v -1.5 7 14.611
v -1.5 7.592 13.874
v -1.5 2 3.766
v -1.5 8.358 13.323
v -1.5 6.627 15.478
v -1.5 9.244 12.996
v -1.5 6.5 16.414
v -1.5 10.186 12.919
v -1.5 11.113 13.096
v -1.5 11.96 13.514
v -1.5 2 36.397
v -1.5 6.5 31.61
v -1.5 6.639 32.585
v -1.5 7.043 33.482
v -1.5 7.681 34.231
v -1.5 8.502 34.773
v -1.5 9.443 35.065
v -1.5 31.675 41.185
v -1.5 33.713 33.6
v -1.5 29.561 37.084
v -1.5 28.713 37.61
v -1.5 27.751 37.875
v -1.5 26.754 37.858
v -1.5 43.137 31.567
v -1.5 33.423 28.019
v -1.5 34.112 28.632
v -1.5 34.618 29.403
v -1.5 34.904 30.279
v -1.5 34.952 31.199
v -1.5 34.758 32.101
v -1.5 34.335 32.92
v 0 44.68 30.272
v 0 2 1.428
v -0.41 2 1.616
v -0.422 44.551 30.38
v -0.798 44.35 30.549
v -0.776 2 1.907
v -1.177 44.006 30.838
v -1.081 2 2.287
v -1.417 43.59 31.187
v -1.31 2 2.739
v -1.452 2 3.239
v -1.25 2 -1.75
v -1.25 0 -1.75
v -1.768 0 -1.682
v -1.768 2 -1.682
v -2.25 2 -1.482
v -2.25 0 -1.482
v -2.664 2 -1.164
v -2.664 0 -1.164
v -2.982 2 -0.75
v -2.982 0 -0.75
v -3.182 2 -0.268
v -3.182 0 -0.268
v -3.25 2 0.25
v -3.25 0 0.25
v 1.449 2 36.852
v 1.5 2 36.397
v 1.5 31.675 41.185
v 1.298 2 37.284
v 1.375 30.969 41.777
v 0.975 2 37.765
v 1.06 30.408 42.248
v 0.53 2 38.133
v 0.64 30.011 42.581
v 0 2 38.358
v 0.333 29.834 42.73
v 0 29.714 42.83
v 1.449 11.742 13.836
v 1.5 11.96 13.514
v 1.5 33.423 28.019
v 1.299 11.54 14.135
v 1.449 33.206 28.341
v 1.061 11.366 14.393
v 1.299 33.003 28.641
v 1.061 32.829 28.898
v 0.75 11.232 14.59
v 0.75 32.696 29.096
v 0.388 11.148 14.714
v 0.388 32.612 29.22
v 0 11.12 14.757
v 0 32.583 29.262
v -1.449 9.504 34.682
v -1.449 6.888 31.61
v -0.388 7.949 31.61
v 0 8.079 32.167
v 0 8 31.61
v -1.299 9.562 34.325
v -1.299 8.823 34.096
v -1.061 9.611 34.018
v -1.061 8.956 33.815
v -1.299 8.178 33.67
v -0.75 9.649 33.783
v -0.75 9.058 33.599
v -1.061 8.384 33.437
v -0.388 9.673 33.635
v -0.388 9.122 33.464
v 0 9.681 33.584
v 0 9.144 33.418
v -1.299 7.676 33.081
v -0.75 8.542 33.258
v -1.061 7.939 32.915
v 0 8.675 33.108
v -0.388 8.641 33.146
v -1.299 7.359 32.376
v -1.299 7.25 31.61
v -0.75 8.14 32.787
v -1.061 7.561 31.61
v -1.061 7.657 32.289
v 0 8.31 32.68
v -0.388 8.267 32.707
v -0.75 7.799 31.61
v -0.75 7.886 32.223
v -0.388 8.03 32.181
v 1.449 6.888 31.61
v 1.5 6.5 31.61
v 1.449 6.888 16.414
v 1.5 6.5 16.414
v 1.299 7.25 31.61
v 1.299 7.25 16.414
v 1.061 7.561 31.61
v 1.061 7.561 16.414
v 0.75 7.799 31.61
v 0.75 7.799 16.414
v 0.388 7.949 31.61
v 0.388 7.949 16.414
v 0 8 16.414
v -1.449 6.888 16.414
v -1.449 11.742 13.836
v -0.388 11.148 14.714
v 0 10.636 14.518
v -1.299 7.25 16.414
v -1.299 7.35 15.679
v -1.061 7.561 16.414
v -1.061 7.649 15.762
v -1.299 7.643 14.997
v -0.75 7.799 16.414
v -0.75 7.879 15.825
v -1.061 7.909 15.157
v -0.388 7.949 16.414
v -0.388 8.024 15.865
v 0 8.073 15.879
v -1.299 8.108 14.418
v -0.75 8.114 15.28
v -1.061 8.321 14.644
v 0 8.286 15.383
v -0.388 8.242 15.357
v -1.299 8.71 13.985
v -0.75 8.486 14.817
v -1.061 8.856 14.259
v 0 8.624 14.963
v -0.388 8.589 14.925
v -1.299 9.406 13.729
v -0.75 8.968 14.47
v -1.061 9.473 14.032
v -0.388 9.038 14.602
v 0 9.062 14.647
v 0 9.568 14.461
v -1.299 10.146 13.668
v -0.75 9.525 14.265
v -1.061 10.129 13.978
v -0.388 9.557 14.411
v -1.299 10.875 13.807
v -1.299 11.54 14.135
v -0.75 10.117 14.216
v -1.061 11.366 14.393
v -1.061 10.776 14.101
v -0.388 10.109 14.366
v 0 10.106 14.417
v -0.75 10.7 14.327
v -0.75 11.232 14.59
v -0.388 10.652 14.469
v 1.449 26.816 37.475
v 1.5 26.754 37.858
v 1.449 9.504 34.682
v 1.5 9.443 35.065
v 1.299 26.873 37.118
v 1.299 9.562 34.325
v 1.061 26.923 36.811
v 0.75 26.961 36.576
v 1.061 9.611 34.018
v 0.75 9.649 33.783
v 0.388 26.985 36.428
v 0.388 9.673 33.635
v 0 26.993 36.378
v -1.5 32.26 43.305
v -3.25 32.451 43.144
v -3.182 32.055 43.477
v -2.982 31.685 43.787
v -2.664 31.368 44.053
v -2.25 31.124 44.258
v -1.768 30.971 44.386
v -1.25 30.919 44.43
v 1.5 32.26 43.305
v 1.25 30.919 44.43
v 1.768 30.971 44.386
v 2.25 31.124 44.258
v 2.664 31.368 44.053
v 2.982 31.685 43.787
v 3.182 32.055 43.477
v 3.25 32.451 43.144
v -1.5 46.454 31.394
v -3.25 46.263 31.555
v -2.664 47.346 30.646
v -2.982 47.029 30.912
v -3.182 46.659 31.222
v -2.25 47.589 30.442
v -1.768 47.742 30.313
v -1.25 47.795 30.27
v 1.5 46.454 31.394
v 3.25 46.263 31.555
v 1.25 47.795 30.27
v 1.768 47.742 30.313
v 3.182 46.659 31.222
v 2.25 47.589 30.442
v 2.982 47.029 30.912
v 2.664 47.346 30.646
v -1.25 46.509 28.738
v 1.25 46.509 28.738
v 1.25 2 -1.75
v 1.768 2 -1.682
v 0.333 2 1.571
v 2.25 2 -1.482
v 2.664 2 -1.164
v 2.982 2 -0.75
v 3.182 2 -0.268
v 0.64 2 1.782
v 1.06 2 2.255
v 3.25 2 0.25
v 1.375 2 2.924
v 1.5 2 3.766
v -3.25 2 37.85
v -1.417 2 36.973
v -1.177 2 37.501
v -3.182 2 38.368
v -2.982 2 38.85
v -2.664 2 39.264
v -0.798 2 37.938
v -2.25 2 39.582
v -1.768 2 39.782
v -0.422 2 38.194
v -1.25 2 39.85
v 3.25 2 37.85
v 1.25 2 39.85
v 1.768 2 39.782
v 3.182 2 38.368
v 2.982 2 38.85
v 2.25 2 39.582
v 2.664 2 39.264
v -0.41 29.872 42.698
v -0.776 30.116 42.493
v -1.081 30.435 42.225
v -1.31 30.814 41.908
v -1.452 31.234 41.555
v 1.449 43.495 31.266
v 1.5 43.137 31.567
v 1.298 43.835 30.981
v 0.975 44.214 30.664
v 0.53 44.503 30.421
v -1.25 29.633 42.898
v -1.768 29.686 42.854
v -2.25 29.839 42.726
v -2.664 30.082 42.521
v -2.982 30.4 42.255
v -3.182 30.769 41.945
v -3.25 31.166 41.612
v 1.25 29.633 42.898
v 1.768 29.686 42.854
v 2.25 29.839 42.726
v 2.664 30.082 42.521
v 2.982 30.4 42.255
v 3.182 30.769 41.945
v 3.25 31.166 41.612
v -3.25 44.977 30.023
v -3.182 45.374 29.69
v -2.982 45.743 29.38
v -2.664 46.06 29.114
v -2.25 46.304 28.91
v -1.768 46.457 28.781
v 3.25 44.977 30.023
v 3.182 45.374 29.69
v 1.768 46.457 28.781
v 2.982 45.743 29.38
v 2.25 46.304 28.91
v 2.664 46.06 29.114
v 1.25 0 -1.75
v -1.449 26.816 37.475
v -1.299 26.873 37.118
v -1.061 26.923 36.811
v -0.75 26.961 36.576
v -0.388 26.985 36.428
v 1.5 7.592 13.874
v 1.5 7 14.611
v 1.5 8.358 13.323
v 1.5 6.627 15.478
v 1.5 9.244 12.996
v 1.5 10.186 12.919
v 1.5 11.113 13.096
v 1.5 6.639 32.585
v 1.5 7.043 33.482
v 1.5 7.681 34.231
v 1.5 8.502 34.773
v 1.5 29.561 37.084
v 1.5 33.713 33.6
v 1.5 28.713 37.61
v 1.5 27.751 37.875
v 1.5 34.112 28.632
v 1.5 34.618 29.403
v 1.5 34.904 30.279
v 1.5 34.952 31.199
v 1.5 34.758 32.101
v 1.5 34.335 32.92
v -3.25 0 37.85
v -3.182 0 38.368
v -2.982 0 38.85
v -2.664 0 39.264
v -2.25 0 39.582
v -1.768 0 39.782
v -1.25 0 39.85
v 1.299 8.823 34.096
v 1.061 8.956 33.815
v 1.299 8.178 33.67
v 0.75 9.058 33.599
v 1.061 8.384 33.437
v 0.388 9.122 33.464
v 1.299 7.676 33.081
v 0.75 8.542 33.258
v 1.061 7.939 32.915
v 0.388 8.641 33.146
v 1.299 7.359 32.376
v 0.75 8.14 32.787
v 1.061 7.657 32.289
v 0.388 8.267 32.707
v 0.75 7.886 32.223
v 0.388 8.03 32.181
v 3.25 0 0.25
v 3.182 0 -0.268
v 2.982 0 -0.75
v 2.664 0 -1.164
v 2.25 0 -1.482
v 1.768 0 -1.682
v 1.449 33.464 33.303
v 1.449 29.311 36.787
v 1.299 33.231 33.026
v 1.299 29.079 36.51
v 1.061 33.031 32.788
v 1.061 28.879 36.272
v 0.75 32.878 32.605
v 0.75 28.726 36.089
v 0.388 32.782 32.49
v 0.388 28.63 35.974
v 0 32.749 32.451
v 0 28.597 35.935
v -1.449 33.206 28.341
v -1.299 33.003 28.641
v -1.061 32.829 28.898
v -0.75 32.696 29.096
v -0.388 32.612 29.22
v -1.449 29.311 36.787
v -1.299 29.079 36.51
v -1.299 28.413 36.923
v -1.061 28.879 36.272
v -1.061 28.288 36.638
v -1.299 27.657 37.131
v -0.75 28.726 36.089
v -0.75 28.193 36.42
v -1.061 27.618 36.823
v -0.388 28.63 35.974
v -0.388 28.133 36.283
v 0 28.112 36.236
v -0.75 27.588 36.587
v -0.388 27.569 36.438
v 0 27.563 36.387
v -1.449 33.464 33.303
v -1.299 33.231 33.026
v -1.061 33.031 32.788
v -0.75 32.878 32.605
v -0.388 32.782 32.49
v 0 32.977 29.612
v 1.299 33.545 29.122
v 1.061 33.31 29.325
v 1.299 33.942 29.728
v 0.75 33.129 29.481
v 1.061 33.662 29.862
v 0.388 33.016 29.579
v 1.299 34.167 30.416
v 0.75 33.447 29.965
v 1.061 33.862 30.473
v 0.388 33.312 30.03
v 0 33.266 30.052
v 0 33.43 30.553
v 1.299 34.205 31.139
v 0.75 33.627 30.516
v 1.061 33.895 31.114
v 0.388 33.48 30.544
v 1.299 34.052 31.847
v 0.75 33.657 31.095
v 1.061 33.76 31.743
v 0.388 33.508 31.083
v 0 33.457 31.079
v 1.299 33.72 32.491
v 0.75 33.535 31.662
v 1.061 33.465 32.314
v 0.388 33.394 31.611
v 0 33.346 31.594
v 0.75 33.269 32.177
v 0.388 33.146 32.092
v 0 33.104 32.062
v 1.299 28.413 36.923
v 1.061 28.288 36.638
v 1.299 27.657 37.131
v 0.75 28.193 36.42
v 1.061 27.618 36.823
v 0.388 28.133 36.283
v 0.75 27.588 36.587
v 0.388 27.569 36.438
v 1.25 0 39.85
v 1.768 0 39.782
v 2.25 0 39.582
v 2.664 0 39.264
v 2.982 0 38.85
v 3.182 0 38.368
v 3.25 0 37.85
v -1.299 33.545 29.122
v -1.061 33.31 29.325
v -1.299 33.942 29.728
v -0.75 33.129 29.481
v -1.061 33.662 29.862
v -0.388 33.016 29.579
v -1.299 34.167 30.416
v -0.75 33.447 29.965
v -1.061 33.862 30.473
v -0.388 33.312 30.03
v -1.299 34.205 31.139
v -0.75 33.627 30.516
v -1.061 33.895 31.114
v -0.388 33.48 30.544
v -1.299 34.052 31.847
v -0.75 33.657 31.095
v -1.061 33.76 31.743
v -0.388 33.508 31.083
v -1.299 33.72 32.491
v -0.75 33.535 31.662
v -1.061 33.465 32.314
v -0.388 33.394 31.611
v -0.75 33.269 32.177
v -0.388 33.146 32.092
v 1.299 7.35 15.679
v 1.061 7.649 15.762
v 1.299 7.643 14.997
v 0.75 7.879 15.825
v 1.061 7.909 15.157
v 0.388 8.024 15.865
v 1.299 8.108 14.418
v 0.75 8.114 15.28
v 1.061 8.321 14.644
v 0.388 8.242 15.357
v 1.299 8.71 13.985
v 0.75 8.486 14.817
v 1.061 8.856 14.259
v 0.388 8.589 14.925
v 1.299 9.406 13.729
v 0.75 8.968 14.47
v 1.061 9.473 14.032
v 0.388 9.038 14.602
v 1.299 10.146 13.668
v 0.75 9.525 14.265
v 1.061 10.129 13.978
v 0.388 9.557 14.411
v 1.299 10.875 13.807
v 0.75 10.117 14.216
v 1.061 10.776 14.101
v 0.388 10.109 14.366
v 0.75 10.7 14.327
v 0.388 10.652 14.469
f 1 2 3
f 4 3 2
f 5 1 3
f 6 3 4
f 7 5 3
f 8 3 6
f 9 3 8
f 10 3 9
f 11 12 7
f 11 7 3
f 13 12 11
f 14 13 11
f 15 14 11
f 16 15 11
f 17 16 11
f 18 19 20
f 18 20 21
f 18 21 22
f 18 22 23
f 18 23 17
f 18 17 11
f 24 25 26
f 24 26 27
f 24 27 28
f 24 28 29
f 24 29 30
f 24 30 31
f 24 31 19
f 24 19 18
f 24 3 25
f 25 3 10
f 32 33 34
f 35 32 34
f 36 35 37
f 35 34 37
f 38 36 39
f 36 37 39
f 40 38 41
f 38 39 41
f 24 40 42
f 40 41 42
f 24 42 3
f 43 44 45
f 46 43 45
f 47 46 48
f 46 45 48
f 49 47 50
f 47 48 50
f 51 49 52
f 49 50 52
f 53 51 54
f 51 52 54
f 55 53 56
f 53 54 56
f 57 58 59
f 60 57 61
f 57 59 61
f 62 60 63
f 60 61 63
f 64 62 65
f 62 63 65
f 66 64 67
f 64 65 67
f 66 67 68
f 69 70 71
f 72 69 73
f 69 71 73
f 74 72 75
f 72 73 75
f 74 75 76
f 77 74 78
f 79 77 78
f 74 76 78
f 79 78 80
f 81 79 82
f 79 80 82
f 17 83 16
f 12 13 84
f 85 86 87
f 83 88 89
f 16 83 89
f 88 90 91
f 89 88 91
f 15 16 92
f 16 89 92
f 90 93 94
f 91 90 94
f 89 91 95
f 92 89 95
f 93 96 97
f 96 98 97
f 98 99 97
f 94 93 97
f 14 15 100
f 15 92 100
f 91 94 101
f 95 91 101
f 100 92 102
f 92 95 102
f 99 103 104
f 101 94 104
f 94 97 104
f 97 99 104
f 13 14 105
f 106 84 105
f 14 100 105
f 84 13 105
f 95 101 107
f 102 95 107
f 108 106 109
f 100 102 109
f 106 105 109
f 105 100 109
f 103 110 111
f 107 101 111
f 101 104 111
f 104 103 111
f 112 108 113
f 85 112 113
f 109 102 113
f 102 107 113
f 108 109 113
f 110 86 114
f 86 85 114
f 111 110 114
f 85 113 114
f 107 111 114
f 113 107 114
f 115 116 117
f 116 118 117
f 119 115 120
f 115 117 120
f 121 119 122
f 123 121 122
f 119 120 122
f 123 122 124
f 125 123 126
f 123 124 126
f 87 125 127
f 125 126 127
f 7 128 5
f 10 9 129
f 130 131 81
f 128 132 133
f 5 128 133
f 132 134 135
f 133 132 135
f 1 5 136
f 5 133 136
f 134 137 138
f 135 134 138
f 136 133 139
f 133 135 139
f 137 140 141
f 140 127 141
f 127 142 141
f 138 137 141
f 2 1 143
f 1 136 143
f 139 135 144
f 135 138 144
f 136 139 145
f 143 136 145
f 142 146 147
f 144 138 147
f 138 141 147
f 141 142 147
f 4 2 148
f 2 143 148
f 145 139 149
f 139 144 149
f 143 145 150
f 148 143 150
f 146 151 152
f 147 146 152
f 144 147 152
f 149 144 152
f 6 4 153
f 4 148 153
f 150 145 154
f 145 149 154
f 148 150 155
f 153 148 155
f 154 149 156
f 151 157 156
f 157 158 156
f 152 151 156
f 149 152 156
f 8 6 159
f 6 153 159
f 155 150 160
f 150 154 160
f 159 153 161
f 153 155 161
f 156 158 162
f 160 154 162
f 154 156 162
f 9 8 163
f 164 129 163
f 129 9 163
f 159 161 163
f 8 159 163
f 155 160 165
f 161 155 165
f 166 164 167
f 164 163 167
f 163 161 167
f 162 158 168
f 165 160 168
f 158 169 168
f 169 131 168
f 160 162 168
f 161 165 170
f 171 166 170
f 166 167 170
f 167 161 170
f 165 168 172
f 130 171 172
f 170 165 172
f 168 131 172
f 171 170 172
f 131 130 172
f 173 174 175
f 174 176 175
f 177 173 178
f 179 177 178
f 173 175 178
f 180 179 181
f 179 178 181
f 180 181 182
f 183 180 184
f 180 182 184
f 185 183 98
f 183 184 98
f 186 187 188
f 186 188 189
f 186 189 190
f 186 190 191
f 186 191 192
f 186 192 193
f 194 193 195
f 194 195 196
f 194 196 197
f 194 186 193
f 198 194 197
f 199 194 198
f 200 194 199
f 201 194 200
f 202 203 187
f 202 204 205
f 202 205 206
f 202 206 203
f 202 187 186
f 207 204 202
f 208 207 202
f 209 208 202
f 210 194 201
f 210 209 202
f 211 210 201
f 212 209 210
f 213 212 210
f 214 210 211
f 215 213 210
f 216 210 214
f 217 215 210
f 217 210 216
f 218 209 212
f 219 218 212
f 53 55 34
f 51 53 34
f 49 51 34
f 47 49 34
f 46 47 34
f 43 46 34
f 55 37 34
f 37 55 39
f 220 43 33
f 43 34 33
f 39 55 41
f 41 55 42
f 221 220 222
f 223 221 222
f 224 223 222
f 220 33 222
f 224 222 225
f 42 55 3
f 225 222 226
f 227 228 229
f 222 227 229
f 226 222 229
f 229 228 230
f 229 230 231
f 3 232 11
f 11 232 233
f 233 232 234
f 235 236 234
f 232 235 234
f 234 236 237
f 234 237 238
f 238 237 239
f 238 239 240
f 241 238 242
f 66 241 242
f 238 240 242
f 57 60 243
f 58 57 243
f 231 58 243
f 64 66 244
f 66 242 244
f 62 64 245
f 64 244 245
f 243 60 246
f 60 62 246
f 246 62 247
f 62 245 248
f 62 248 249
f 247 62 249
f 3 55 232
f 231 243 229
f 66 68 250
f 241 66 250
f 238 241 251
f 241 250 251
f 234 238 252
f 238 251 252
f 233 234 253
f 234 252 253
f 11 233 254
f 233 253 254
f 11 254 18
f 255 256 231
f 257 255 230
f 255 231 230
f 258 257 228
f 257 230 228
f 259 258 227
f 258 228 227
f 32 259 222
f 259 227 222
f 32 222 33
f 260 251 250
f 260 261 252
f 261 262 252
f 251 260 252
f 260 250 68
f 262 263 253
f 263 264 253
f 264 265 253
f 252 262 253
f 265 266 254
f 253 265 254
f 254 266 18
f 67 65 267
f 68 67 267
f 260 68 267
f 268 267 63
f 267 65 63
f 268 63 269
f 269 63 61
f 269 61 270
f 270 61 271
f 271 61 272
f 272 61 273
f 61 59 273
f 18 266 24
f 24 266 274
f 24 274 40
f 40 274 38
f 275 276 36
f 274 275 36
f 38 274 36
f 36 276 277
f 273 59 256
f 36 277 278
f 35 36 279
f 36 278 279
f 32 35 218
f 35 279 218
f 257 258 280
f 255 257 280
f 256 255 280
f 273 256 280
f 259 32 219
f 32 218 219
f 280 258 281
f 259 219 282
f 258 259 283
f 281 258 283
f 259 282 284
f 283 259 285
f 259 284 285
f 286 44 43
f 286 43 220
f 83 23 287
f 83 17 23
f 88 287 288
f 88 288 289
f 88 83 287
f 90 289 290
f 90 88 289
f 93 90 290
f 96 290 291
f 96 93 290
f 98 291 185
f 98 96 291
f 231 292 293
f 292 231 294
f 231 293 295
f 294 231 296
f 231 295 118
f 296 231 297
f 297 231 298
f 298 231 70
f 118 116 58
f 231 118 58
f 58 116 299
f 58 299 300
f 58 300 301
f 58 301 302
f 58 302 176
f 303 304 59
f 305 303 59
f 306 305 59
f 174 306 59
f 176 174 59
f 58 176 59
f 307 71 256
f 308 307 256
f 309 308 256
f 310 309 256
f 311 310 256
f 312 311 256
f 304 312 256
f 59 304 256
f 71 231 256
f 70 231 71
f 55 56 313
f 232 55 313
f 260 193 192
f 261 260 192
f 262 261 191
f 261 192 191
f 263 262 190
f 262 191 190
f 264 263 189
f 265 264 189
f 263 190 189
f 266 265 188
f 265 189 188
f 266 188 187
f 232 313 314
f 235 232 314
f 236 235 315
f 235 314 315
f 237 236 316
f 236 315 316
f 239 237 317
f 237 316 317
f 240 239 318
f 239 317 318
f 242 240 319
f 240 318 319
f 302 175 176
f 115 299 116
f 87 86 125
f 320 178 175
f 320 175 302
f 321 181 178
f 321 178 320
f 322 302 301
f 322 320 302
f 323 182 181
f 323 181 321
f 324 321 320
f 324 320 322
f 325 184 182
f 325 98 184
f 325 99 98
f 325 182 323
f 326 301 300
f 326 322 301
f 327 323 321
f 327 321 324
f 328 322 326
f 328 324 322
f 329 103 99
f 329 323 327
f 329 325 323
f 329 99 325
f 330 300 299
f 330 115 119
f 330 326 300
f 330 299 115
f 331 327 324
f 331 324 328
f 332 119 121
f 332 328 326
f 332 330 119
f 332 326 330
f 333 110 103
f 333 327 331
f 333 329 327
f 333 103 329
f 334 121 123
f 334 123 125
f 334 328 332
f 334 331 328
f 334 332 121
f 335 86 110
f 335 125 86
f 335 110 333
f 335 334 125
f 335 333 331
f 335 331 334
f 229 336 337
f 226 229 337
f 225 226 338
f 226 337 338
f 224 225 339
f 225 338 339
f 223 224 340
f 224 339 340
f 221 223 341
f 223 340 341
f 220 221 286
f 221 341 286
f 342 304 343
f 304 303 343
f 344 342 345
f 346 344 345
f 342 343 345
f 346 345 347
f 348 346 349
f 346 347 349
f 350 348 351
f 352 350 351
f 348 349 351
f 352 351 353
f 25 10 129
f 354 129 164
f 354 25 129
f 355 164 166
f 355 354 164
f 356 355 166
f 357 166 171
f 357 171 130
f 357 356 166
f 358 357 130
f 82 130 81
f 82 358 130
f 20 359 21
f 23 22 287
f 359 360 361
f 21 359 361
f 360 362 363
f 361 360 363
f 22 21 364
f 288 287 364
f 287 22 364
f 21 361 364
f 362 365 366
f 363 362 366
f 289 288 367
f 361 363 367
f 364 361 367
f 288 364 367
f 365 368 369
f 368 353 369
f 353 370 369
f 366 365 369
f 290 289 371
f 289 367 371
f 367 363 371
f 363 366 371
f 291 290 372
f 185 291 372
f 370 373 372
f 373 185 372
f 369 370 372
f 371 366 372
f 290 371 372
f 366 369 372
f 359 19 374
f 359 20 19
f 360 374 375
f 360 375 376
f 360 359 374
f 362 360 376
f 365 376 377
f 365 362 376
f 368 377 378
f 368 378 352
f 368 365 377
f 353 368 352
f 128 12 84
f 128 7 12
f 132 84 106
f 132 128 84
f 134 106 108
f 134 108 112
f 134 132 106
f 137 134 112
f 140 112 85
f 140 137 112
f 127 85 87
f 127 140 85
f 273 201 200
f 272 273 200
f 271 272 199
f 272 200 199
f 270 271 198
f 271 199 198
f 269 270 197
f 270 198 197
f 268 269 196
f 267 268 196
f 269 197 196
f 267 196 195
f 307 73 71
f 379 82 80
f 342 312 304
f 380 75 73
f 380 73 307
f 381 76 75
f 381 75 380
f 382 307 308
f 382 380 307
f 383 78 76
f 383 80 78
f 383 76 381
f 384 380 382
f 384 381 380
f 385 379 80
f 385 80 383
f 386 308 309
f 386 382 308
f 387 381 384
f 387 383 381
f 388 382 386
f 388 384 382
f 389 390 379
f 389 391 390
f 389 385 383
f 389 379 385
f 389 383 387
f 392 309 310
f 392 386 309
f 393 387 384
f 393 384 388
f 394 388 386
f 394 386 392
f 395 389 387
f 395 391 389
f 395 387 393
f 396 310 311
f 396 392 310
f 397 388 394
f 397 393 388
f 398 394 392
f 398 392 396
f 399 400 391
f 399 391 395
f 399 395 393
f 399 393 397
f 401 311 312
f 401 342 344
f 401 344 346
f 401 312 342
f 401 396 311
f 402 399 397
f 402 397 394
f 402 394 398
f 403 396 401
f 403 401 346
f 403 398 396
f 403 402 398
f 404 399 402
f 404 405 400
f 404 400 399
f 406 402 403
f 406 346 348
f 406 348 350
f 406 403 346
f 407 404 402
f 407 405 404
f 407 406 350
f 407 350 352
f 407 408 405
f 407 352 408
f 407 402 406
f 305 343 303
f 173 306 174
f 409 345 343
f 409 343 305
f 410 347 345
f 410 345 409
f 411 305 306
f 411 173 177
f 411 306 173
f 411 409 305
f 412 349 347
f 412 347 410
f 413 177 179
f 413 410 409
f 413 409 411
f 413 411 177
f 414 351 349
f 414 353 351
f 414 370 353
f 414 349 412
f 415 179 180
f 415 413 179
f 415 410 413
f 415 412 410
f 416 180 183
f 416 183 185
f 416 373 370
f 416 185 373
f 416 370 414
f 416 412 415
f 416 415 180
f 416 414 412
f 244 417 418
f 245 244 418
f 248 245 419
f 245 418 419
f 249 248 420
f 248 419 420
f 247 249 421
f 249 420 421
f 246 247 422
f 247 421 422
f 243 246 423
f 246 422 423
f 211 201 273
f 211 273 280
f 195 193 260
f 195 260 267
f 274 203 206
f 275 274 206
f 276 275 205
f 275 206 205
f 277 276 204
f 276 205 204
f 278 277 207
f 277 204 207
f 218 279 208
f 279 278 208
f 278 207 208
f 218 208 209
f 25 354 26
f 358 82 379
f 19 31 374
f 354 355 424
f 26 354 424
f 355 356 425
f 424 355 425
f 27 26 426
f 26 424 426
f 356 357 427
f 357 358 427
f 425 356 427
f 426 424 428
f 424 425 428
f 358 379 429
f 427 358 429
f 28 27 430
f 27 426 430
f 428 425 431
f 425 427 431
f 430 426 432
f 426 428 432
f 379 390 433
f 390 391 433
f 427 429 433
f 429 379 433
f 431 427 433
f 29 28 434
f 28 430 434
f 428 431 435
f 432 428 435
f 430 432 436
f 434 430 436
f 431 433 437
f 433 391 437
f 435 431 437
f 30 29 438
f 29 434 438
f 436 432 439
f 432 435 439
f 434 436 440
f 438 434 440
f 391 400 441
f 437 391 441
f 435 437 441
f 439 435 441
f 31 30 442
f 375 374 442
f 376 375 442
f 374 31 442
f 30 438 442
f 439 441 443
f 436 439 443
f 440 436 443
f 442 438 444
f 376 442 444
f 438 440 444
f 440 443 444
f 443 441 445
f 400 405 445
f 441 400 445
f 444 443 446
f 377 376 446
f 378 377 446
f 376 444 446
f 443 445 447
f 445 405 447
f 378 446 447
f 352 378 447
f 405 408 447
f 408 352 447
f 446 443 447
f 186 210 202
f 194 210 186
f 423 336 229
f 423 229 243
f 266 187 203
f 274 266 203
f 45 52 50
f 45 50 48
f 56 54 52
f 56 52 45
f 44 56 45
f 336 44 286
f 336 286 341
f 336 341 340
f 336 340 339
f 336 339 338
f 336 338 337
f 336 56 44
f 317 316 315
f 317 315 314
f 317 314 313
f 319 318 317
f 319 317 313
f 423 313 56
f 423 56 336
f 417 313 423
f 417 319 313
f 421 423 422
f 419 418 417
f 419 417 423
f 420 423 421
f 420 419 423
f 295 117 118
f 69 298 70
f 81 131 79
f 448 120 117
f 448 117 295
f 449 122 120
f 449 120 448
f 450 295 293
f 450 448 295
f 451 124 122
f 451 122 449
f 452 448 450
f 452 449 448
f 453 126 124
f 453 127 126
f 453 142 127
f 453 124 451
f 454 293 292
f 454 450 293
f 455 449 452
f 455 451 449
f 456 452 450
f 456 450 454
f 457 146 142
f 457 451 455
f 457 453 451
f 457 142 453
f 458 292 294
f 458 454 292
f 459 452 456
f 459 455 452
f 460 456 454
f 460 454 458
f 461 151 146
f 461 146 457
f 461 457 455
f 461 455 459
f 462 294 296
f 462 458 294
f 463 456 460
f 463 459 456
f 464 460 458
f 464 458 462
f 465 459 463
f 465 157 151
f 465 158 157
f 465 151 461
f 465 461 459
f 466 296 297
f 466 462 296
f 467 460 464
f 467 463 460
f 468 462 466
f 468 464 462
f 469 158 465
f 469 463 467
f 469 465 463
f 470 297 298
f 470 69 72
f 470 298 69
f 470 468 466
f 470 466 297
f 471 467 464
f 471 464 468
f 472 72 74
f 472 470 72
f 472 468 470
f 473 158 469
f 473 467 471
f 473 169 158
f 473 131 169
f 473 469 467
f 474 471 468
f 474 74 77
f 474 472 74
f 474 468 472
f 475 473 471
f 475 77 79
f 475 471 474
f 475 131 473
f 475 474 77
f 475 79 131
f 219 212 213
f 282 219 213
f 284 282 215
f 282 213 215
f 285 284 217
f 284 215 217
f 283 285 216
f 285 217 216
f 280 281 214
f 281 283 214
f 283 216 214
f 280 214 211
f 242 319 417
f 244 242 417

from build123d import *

# Parameters (mm, degrees)
BOSS_EXTRUDE1_DEPTH     = 1.5
SKETCH2_W               = 6.5
SKETCH2_H               = 41.6
BOSS_EXTRUDE2_DEPTH     = 2
SKETCH3_W               = 6.5
SKETCH3_H               = 22.029549655
BOSS_EXTRUDE3_DEPTH     = 2
CUT_EXTRUDE1_DEPTH      = 66.428669726
CUT_EXTRUDE1_DEPTH_BACK = 66.428669726
FILLET1_R               = 2
FILLET2_R               = 1.5


# Some blends are built 0.0001 mm under size
with BuildPart() as part:
    # Sketch1 → Boss-Extrude1 (new, symmetric)
    with BuildSketch(Plane(origin=(0, 0, 0), x_dir=(0, 0, -1), z_dir=(1, 0, 0))):
        Polygon((-43.305040632, 32.259635184), (-38.1, 0), (0, 0), (-31.3944757, 46.45409373), align=None)
    extrude(amount=BOSS_EXTRUDE1_DEPTH, both=True)

    # Sketch2 → Boss-Extrude2 (add)
    with BuildSketch(Plane.XZ):
        with Locations((0, 19.05)):
            Rectangle(SKETCH2_W, SKETCH2_H)
    extrude(amount=-BOSS_EXTRUDE2_DEPTH)

    # Sketch3 → Boss-Extrude3 (add)
    with BuildSketch(Plane(origin=(0, 34.65247404, 41.29721043), x_dir=(1, 0, 0), z_dir=(0, 0.6427876096865434, 0.7660444431189747))):
        with Locations((0, 6.141145543)):
            Rectangle(SKETCH3_W, SKETCH3_H)
    extrude(amount=-BOSS_EXTRUDE3_DEPTH)

    # Sketch4 → Cut-Extrude1 (cut, two sides: drawn at the far end of the back side and taken through both)
    with BuildSketch(Plane(origin=(1.5, 0, 0), x_dir=(0, 0, -1), z_dir=(1, 0, 0)).offset(-CUT_EXTRUDE1_DEPTH_BACK)):
        Polygon((-36.523365649, 27.895930093), (-33.313189095, 8), (-12.648239091, 8), (-30.746767143, 34.780212116), align=None)
    extrude(amount=CUT_EXTRUDE1_DEPTH + CUT_EXTRUDE1_DEPTH_BACK, mode=Mode.SUBTRACT)

    # Fillet1
    # the kernel refuses this fillet: 2 mm, written as the material it adds along each edge
    with BuildSketch(Plane(origin=(1.5, 34.780212116, 30.746767143), x_dir=(0, -0.8285345686504685, -0.5599379149076996), z_dir=(-1, 0, 0))) as fillet1_piece_1:
        with BuildLine():
            CenterArc((FILLET1_R * 1.32580458231, FILLET1_R), FILLET1_R, 164.051504254, 105.948495746)
            Line((FILLET1_R * 0.364295499179, FILLET1_R * 1.27477314835), (0, 0))
            Line((0, 0), (FILLET1_R * 1.32580458231, 0))
        make_face()
    extrude(amount=3)
    with BuildSketch(Plane(origin=(-1.5, 8, 12.648239091), x_dir=(0, 0, 1), z_dir=(1, 0, 0))) as fillet1_piece_2:
        with BuildLine():
            CenterArc((FILLET1_R * 1.88276744741, -FILLET1_R), FILLET1_R, 90, 124.051504254)
            Line((FILLET1_R * 1.05423287876, -FILLET1_R * 1.55993791491), (0, 0))
            Line((0, 0), (FILLET1_R * 1.88276744741, 0))
        make_face()
    extrude(amount=3)
    with BuildSketch(Plane(origin=(1.5, 27.895930093, 36.523365649), x_dir=(0, 0.7660444431189765, -0.6427876096865413), z_dir=(-1, 0, 0))) as fillet1_piece_3:
        with BuildLine():
            CenterArc((FILLET1_R * 0.457472572927, FILLET1_R), FILLET1_R, 220.834409573, 49.165590427)
            Line((-FILLET1_R * 0.299129927729, FILLET1_R * 0.346124892658), (0, 0))
            Line((0, 0), (FILLET1_R * 0.457472572927, 0))
        make_face()
    extrude(amount=3)
    with BuildSketch(Plane(origin=(-1.5, 8, 33.313189095), x_dir=(0, 0, -1), z_dir=(1, 0, 0))) as fillet1_piece_4:
        with BuildLine():
            CenterArc((FILLET1_R * 0.851584618699, FILLET1_R), FILLET1_R, 189.165590427, 80.834409573)
            Line((-FILLET1_R * 0.135647486653, FILLET1_R * 0.840711676004), (0, 0))
            Line((0, 0), (FILLET1_R * 0.851584618699, 0))
        make_face()
    extrude(amount=3)
    # the kernel refuses this fillet: 2 mm, written as the material it takes off along each edge
    with BuildSketch(Plane(origin=(-1.5, 34.586150343, 43.680420138), x_dir=(0, 0.1592883239956265, -0.9872321053524669), z_dir=(0, -0.987232105352467, -0.15928832399562654))) as fillet1_2_piece_1_section:
        with BuildLine():
            CenterArc((FILLET1_R, FILLET1_R), FILLET1_R, 180, 90)
            Line((0, FILLET1_R), (0, 0))
            Line((0, 0), (FILLET1_R, 0))
        make_face()
    fillet1_2_piece_1 = extrude(amount=38.007587746, mode=Mode.PRIVATE)
    fillet1_2_piece_1 = split(fillet1_2_piece_1, bisect_by=Plane(origin=(-1.056244864, 22.976919754, 48.483349146), z_dir=(0, -0.6427876096865434, -0.7660444431189747)), keep=Keep.TOP, mode=Mode.PRIVATE)
    fillet1_2_piece_1 = split(fillet1_2_piece_1, bisect_by=Plane(origin=(-1.056244864, 2, 40.232595457), z_dir=(0, 1, 0)), keep=Keep.TOP, mode=Mode.PRIVATE)
    add(fillet1_2_piece_1, mode=Mode.SUBTRACT)
    with BuildSketch(Plane(origin=(-1.5, -2.142672843, -1.448055168), x_dir=(1, 0, 0), z_dir=(0, 0.8285345686504687, 0.5599379149076993))) as fillet1_2_piece_2_section:
        with BuildLine():
            CenterArc((FILLET1_R, -FILLET1_R), FILLET1_R, 90, 90)
            Line((0, -FILLET1_R), (0, 0))
            Line((0, 0), (FILLET1_R, 0))
        make_face()
    fillet1_2_piece_2 = extrude(amount=61.573815732, mode=Mode.PRIVATE)
    fillet1_2_piece_2 = split(fillet1_2_piece_2, bisect_by=Plane(origin=(-1.05170861, 38.993973381, 35.043445356), z_dir=(0, -0.6427876096865434, -0.7660444431189747)), keep=Keep.TOP, mode=Mode.PRIVATE)
    fillet1_2_piece_2 = split(fillet1_2_piece_2, bisect_by=Plane(origin=(-1.05170861, 2, 16.20714214), z_dir=(0, 1, 0)), keep=Keep.TOP, mode=Mode.PRIVATE)
    add(fillet1_2_piece_2, mode=Mode.SUBTRACT)
    with BuildSketch(Plane(origin=(1.5, -2.142672843, -1.448055168), x_dir=(0, -0.5599379149076993, 0.8285345686504687), z_dir=(0, 0.8285345686504687, 0.5599379149076993))) as fillet1_2_piece_3_section:
        with BuildLine():
            CenterArc((FILLET1_R, -FILLET1_R), FILLET1_R, 90, 90)
            Line((0, -FILLET1_R), (0, 0))
            Line((0, 0), (FILLET1_R, 0))
        make_face()
    fillet1_2_piece_3 = extrude(amount=61.573815732, mode=Mode.PRIVATE)
    fillet1_2_piece_3 = split(fillet1_2_piece_3, bisect_by=Plane(origin=(1.05170861, 38.993973381, 35.043445356), z_dir=(0, -0.6427876096865434, -0.7660444431189747)), keep=Keep.TOP, mode=Mode.PRIVATE)
    fillet1_2_piece_3 = split(fillet1_2_piece_3, bisect_by=Plane(origin=(1.05170861, 2, 16.20714214), z_dir=(0, 1, 0)), keep=Keep.TOP, mode=Mode.PRIVATE)
    add(fillet1_2_piece_3, mode=Mode.SUBTRACT)
    with BuildSketch(Plane(origin=(1.5, 34.586150343, 43.680420138), x_dir=(0, 0.1592883239956265, -0.9872321053524669), z_dir=(0, -0.987232105352467, -0.15928832399562654))) as fillet1_2_piece_4_section:
        with BuildLine():
            CenterArc((FILLET1_R, -FILLET1_R), FILLET1_R, 90, 90)
            Line((0, -FILLET1_R), (0, 0))
            Line((0, 0), (FILLET1_R, 0))
        make_face()
    fillet1_2_piece_4 = extrude(amount=38.007587746, mode=Mode.PRIVATE)
    fillet1_2_piece_4 = split(fillet1_2_piece_4, bisect_by=Plane(origin=(1.056244864, 22.976919754, 48.483349146), z_dir=(0, -0.6427876096865434, -0.7660444431189747)), keep=Keep.TOP, mode=Mode.PRIVATE)
    fillet1_2_piece_4 = split(fillet1_2_piece_4, bisect_by=Plane(origin=(1.056244864, 2, 40.232595457), z_dir=(0, 1, 0)), keep=Keep.TOP, mode=Mode.PRIVATE)
    add(fillet1_2_piece_4, mode=Mode.SUBTRACT)
    with BuildSketch(Plane(origin=(-3.25, 51.008609554, 34.099819599), x_dir=(0, -0.7660444431189747, 0.6427876096865432), z_dir=(0, -0.6427876096865434, -0.7660444431189747)), Plane(origin=(-3.25, -5, 39.85), x_dir=(0, 0, -1), z_dir=(0, 1, 0)), Plane(origin=(3.25, -5, 39.85), x_dir=(-1, 0, 0), z_dir=(0, 1, 0))) as fillet1_2_piece_5:
        with BuildLine():
            CenterArc((FILLET1_R, -FILLET1_R), FILLET1_R, 90, 90)
            Line((0, -FILLET1_R), (0, 0))
            Line((0, 0), (FILLET1_R, 0))
        make_face()
    extrude(amount=12, mode=Mode.SUBTRACT)
    with BuildSketch(Plane(origin=(-3.25, 34.132995457, 48.260141164), x_dir=(0, 0.7660444431189747, -0.6427876096865434), z_dir=(0, -0.6427876096865434, -0.7660444431189747)), Plane(origin=(3.25, 34.132995457, 48.260141164), x_dir=(-1, 0, 0), z_dir=(0, -0.6427876096865434, -0.7660444431189747))) as fillet1_2_piece_6:
        with BuildLine():
            CenterArc((FILLET1_R, FILLET1_R), FILLET1_R, 180, 90)
            Line((0, FILLET1_R), (0, 0))
            Line((0, 0), (FILLET1_R, 0))
        make_face()
    extrude(amount=7, mode=Mode.SUBTRACT)
    with BuildSketch(Plane(origin=(3.25, 51.008609554, 34.099819599), x_dir=(0, -0.7660444431189747, 0.6427876096865432), z_dir=(0, -0.6427876096865434, -0.7660444431189747)), Plane(origin=(-3.25, -5, -1.75), x_dir=(0, 0, 1), z_dir=(0, 1, 0)), Plane(origin=(3.25, -5, -1.75), x_dir=(-1, 0, 0), z_dir=(0, 1, 0))) as fillet1_2_piece_7:
        with BuildLine():
            CenterArc((FILLET1_R, FILLET1_R), FILLET1_R, 180, 90)
            Line((0, FILLET1_R), (0, 0))
            Line((0, 0), (FILLET1_R, 0))
        make_face()
    extrude(amount=12, mode=Mode.SUBTRACT)

    # Fillet2
    fillet2_edges = [part.edges().sort_by_distance(p)[0] for p in [
        (1.5, 9.061850667, 14.647456961),
        (1.5, 21.851569045, 22.009367742),
        (1.5, 33.460692344, 30.815325558),
        (1.5, 30.672890194, 34.193219453),
        (1.5, 27.842934726, 36.331192599),
        (1.5, 18.337045111, 34.981054819),
        (1.5, 8.477312689, 32.906716951),
        (-1.5, 9.061850667, 14.647456961),
        (-1.5, 21.851569045, 22.009367742),
        (-1.5, 33.460692344, 30.815325558),
        (-1.5, 30.672890194, 34.193219453),
        (-1.5, 27.842934726, 36.331192599),
        (-1.5, 18.337045111, 34.981054819),
        (-1.5, 8.477312689, 32.906716951),
        (1.5, 8, 24.011896921),
        (-1.5, 8, 24.011896921),
    ]]
    fillet(fillet2_edges, radius=FILLET2_R - 0.0001)  # a hair under: the kernel refuses the full size


solid = part.part
